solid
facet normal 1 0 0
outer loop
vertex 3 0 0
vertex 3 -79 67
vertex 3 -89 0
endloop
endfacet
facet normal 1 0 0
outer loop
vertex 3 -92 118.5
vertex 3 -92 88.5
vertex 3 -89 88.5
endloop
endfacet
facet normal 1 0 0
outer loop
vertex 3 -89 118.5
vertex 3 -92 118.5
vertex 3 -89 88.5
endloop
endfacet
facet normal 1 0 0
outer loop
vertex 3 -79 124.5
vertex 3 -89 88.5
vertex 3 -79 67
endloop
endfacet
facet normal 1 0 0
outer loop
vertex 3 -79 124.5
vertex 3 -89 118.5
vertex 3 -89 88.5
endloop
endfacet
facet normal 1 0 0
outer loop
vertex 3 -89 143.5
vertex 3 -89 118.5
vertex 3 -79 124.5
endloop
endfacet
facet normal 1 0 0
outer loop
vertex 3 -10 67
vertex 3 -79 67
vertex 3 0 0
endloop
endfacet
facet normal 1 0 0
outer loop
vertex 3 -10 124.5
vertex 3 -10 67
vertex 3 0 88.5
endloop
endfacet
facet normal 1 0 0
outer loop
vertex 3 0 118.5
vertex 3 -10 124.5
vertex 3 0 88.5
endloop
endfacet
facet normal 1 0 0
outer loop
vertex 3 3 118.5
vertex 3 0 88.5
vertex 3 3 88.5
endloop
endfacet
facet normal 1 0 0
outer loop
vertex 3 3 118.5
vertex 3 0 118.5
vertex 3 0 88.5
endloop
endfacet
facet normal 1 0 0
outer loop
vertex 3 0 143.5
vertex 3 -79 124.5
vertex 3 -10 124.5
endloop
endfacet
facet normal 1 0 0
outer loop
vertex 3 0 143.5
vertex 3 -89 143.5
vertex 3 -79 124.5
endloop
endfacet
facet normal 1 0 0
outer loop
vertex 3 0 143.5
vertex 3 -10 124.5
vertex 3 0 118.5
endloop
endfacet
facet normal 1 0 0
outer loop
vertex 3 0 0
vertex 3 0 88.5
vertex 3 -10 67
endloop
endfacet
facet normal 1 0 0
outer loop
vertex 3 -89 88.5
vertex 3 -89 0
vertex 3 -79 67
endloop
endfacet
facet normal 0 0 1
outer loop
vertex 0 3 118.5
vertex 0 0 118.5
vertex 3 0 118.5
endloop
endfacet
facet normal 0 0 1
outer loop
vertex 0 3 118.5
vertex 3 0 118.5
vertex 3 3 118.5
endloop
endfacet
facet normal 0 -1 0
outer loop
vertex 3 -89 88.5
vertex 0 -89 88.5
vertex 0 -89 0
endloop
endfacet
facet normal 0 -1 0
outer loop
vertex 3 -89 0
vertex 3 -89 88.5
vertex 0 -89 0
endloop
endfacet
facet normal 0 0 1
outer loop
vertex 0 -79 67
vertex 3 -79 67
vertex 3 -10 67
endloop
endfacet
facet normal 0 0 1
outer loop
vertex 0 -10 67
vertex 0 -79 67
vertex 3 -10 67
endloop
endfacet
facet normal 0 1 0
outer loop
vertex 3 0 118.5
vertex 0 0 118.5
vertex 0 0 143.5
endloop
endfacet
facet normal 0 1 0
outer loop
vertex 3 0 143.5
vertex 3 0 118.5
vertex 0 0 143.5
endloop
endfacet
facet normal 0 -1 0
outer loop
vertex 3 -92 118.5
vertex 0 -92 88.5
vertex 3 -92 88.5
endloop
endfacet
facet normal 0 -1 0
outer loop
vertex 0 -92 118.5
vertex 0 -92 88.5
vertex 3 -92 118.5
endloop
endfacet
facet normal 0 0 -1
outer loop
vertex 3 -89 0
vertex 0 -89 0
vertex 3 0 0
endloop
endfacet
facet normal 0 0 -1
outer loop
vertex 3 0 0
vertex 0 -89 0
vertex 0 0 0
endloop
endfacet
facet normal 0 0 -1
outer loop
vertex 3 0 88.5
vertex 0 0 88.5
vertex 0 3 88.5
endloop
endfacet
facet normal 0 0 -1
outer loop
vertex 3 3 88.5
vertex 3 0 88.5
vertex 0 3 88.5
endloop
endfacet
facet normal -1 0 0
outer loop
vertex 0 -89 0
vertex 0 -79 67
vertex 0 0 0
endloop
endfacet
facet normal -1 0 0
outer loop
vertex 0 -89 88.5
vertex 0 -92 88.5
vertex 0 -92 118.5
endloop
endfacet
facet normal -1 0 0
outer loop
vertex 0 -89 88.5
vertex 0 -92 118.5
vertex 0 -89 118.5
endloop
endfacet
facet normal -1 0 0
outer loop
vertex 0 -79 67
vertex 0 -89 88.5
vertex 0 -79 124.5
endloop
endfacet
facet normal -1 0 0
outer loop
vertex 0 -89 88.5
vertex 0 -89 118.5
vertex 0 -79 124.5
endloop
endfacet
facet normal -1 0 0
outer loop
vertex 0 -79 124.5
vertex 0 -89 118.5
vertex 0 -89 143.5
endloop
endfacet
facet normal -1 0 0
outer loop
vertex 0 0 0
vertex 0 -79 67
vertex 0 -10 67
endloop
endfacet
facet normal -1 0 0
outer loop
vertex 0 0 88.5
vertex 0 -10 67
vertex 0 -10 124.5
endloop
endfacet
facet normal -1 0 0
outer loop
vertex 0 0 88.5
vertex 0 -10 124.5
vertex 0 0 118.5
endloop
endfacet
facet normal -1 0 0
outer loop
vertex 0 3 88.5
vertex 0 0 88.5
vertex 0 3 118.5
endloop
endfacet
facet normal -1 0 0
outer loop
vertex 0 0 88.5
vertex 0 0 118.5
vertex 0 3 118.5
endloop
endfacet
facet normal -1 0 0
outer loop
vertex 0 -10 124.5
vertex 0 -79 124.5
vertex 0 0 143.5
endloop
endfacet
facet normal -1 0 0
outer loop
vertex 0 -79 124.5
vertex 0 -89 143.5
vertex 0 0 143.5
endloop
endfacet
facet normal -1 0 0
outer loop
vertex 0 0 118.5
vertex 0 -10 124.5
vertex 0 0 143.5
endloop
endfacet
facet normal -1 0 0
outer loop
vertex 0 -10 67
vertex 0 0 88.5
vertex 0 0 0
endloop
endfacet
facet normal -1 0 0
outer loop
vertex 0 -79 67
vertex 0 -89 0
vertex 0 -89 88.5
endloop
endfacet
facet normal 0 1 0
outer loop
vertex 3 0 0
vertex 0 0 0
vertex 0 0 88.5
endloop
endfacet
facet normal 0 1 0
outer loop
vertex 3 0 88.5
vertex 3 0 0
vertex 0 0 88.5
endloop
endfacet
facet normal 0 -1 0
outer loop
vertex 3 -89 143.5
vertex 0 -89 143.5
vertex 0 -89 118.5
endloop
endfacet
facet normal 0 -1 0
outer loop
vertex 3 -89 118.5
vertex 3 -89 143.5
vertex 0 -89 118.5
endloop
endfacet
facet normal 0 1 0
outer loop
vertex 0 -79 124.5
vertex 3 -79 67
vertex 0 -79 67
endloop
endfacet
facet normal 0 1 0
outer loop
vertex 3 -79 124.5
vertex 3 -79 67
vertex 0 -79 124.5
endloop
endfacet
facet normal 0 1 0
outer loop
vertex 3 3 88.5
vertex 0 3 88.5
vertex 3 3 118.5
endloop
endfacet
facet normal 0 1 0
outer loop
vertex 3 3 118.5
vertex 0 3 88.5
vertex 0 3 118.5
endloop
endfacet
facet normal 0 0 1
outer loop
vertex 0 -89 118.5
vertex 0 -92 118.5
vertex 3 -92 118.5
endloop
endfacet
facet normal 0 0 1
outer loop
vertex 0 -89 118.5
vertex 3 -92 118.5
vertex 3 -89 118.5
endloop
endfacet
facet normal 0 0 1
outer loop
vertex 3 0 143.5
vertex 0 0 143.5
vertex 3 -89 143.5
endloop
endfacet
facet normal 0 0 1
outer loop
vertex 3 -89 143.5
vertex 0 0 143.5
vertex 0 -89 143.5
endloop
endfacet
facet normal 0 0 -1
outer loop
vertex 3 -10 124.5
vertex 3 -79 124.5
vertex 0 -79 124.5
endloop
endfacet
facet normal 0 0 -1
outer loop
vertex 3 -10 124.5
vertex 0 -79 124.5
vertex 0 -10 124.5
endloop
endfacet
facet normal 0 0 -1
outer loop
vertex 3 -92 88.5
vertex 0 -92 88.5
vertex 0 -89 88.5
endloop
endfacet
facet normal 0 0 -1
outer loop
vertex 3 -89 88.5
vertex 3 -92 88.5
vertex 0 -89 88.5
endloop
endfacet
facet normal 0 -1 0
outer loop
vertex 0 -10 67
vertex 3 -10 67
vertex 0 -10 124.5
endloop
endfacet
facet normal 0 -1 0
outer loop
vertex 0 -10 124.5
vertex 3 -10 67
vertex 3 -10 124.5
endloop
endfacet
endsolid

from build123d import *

# Parameters (mm, degrees)
F0_W     = 3
F0_H     = 30
F1_DEPTH = 3
F2_W     = 69
F2_H     = 57.5
F3_DEPTH = 25


with BuildPart() as f1:
    # F0 (on Right) → F1 (new body)
    with BuildSketch(Plane.YZ):
        Polygon((-89, 0), (0, 0), (0, 88.5), (0, 118.5), (0, 143.5), (-89, 143.5), (-89, 118.5), (-89, 88.5), align=None)
        with Locations((1.5, 103.5)):
            Rectangle(F0_W, F0_H)
        with Locations((-90.5, 103.5)):
            Rectangle(F0_W, F0_H)
    extrude(amount=F1_DEPTH)

    # F2 (on face) → F3 (cut)
    with BuildSketch(Plane.YZ.offset(3)):
        with Locations((-44.5, 95.75)):
            Rectangle(F2_W, F2_H)
    extrude(amount=-F3_DEPTH, mode=Mode.SUBTRACT)


solid = f1.part
